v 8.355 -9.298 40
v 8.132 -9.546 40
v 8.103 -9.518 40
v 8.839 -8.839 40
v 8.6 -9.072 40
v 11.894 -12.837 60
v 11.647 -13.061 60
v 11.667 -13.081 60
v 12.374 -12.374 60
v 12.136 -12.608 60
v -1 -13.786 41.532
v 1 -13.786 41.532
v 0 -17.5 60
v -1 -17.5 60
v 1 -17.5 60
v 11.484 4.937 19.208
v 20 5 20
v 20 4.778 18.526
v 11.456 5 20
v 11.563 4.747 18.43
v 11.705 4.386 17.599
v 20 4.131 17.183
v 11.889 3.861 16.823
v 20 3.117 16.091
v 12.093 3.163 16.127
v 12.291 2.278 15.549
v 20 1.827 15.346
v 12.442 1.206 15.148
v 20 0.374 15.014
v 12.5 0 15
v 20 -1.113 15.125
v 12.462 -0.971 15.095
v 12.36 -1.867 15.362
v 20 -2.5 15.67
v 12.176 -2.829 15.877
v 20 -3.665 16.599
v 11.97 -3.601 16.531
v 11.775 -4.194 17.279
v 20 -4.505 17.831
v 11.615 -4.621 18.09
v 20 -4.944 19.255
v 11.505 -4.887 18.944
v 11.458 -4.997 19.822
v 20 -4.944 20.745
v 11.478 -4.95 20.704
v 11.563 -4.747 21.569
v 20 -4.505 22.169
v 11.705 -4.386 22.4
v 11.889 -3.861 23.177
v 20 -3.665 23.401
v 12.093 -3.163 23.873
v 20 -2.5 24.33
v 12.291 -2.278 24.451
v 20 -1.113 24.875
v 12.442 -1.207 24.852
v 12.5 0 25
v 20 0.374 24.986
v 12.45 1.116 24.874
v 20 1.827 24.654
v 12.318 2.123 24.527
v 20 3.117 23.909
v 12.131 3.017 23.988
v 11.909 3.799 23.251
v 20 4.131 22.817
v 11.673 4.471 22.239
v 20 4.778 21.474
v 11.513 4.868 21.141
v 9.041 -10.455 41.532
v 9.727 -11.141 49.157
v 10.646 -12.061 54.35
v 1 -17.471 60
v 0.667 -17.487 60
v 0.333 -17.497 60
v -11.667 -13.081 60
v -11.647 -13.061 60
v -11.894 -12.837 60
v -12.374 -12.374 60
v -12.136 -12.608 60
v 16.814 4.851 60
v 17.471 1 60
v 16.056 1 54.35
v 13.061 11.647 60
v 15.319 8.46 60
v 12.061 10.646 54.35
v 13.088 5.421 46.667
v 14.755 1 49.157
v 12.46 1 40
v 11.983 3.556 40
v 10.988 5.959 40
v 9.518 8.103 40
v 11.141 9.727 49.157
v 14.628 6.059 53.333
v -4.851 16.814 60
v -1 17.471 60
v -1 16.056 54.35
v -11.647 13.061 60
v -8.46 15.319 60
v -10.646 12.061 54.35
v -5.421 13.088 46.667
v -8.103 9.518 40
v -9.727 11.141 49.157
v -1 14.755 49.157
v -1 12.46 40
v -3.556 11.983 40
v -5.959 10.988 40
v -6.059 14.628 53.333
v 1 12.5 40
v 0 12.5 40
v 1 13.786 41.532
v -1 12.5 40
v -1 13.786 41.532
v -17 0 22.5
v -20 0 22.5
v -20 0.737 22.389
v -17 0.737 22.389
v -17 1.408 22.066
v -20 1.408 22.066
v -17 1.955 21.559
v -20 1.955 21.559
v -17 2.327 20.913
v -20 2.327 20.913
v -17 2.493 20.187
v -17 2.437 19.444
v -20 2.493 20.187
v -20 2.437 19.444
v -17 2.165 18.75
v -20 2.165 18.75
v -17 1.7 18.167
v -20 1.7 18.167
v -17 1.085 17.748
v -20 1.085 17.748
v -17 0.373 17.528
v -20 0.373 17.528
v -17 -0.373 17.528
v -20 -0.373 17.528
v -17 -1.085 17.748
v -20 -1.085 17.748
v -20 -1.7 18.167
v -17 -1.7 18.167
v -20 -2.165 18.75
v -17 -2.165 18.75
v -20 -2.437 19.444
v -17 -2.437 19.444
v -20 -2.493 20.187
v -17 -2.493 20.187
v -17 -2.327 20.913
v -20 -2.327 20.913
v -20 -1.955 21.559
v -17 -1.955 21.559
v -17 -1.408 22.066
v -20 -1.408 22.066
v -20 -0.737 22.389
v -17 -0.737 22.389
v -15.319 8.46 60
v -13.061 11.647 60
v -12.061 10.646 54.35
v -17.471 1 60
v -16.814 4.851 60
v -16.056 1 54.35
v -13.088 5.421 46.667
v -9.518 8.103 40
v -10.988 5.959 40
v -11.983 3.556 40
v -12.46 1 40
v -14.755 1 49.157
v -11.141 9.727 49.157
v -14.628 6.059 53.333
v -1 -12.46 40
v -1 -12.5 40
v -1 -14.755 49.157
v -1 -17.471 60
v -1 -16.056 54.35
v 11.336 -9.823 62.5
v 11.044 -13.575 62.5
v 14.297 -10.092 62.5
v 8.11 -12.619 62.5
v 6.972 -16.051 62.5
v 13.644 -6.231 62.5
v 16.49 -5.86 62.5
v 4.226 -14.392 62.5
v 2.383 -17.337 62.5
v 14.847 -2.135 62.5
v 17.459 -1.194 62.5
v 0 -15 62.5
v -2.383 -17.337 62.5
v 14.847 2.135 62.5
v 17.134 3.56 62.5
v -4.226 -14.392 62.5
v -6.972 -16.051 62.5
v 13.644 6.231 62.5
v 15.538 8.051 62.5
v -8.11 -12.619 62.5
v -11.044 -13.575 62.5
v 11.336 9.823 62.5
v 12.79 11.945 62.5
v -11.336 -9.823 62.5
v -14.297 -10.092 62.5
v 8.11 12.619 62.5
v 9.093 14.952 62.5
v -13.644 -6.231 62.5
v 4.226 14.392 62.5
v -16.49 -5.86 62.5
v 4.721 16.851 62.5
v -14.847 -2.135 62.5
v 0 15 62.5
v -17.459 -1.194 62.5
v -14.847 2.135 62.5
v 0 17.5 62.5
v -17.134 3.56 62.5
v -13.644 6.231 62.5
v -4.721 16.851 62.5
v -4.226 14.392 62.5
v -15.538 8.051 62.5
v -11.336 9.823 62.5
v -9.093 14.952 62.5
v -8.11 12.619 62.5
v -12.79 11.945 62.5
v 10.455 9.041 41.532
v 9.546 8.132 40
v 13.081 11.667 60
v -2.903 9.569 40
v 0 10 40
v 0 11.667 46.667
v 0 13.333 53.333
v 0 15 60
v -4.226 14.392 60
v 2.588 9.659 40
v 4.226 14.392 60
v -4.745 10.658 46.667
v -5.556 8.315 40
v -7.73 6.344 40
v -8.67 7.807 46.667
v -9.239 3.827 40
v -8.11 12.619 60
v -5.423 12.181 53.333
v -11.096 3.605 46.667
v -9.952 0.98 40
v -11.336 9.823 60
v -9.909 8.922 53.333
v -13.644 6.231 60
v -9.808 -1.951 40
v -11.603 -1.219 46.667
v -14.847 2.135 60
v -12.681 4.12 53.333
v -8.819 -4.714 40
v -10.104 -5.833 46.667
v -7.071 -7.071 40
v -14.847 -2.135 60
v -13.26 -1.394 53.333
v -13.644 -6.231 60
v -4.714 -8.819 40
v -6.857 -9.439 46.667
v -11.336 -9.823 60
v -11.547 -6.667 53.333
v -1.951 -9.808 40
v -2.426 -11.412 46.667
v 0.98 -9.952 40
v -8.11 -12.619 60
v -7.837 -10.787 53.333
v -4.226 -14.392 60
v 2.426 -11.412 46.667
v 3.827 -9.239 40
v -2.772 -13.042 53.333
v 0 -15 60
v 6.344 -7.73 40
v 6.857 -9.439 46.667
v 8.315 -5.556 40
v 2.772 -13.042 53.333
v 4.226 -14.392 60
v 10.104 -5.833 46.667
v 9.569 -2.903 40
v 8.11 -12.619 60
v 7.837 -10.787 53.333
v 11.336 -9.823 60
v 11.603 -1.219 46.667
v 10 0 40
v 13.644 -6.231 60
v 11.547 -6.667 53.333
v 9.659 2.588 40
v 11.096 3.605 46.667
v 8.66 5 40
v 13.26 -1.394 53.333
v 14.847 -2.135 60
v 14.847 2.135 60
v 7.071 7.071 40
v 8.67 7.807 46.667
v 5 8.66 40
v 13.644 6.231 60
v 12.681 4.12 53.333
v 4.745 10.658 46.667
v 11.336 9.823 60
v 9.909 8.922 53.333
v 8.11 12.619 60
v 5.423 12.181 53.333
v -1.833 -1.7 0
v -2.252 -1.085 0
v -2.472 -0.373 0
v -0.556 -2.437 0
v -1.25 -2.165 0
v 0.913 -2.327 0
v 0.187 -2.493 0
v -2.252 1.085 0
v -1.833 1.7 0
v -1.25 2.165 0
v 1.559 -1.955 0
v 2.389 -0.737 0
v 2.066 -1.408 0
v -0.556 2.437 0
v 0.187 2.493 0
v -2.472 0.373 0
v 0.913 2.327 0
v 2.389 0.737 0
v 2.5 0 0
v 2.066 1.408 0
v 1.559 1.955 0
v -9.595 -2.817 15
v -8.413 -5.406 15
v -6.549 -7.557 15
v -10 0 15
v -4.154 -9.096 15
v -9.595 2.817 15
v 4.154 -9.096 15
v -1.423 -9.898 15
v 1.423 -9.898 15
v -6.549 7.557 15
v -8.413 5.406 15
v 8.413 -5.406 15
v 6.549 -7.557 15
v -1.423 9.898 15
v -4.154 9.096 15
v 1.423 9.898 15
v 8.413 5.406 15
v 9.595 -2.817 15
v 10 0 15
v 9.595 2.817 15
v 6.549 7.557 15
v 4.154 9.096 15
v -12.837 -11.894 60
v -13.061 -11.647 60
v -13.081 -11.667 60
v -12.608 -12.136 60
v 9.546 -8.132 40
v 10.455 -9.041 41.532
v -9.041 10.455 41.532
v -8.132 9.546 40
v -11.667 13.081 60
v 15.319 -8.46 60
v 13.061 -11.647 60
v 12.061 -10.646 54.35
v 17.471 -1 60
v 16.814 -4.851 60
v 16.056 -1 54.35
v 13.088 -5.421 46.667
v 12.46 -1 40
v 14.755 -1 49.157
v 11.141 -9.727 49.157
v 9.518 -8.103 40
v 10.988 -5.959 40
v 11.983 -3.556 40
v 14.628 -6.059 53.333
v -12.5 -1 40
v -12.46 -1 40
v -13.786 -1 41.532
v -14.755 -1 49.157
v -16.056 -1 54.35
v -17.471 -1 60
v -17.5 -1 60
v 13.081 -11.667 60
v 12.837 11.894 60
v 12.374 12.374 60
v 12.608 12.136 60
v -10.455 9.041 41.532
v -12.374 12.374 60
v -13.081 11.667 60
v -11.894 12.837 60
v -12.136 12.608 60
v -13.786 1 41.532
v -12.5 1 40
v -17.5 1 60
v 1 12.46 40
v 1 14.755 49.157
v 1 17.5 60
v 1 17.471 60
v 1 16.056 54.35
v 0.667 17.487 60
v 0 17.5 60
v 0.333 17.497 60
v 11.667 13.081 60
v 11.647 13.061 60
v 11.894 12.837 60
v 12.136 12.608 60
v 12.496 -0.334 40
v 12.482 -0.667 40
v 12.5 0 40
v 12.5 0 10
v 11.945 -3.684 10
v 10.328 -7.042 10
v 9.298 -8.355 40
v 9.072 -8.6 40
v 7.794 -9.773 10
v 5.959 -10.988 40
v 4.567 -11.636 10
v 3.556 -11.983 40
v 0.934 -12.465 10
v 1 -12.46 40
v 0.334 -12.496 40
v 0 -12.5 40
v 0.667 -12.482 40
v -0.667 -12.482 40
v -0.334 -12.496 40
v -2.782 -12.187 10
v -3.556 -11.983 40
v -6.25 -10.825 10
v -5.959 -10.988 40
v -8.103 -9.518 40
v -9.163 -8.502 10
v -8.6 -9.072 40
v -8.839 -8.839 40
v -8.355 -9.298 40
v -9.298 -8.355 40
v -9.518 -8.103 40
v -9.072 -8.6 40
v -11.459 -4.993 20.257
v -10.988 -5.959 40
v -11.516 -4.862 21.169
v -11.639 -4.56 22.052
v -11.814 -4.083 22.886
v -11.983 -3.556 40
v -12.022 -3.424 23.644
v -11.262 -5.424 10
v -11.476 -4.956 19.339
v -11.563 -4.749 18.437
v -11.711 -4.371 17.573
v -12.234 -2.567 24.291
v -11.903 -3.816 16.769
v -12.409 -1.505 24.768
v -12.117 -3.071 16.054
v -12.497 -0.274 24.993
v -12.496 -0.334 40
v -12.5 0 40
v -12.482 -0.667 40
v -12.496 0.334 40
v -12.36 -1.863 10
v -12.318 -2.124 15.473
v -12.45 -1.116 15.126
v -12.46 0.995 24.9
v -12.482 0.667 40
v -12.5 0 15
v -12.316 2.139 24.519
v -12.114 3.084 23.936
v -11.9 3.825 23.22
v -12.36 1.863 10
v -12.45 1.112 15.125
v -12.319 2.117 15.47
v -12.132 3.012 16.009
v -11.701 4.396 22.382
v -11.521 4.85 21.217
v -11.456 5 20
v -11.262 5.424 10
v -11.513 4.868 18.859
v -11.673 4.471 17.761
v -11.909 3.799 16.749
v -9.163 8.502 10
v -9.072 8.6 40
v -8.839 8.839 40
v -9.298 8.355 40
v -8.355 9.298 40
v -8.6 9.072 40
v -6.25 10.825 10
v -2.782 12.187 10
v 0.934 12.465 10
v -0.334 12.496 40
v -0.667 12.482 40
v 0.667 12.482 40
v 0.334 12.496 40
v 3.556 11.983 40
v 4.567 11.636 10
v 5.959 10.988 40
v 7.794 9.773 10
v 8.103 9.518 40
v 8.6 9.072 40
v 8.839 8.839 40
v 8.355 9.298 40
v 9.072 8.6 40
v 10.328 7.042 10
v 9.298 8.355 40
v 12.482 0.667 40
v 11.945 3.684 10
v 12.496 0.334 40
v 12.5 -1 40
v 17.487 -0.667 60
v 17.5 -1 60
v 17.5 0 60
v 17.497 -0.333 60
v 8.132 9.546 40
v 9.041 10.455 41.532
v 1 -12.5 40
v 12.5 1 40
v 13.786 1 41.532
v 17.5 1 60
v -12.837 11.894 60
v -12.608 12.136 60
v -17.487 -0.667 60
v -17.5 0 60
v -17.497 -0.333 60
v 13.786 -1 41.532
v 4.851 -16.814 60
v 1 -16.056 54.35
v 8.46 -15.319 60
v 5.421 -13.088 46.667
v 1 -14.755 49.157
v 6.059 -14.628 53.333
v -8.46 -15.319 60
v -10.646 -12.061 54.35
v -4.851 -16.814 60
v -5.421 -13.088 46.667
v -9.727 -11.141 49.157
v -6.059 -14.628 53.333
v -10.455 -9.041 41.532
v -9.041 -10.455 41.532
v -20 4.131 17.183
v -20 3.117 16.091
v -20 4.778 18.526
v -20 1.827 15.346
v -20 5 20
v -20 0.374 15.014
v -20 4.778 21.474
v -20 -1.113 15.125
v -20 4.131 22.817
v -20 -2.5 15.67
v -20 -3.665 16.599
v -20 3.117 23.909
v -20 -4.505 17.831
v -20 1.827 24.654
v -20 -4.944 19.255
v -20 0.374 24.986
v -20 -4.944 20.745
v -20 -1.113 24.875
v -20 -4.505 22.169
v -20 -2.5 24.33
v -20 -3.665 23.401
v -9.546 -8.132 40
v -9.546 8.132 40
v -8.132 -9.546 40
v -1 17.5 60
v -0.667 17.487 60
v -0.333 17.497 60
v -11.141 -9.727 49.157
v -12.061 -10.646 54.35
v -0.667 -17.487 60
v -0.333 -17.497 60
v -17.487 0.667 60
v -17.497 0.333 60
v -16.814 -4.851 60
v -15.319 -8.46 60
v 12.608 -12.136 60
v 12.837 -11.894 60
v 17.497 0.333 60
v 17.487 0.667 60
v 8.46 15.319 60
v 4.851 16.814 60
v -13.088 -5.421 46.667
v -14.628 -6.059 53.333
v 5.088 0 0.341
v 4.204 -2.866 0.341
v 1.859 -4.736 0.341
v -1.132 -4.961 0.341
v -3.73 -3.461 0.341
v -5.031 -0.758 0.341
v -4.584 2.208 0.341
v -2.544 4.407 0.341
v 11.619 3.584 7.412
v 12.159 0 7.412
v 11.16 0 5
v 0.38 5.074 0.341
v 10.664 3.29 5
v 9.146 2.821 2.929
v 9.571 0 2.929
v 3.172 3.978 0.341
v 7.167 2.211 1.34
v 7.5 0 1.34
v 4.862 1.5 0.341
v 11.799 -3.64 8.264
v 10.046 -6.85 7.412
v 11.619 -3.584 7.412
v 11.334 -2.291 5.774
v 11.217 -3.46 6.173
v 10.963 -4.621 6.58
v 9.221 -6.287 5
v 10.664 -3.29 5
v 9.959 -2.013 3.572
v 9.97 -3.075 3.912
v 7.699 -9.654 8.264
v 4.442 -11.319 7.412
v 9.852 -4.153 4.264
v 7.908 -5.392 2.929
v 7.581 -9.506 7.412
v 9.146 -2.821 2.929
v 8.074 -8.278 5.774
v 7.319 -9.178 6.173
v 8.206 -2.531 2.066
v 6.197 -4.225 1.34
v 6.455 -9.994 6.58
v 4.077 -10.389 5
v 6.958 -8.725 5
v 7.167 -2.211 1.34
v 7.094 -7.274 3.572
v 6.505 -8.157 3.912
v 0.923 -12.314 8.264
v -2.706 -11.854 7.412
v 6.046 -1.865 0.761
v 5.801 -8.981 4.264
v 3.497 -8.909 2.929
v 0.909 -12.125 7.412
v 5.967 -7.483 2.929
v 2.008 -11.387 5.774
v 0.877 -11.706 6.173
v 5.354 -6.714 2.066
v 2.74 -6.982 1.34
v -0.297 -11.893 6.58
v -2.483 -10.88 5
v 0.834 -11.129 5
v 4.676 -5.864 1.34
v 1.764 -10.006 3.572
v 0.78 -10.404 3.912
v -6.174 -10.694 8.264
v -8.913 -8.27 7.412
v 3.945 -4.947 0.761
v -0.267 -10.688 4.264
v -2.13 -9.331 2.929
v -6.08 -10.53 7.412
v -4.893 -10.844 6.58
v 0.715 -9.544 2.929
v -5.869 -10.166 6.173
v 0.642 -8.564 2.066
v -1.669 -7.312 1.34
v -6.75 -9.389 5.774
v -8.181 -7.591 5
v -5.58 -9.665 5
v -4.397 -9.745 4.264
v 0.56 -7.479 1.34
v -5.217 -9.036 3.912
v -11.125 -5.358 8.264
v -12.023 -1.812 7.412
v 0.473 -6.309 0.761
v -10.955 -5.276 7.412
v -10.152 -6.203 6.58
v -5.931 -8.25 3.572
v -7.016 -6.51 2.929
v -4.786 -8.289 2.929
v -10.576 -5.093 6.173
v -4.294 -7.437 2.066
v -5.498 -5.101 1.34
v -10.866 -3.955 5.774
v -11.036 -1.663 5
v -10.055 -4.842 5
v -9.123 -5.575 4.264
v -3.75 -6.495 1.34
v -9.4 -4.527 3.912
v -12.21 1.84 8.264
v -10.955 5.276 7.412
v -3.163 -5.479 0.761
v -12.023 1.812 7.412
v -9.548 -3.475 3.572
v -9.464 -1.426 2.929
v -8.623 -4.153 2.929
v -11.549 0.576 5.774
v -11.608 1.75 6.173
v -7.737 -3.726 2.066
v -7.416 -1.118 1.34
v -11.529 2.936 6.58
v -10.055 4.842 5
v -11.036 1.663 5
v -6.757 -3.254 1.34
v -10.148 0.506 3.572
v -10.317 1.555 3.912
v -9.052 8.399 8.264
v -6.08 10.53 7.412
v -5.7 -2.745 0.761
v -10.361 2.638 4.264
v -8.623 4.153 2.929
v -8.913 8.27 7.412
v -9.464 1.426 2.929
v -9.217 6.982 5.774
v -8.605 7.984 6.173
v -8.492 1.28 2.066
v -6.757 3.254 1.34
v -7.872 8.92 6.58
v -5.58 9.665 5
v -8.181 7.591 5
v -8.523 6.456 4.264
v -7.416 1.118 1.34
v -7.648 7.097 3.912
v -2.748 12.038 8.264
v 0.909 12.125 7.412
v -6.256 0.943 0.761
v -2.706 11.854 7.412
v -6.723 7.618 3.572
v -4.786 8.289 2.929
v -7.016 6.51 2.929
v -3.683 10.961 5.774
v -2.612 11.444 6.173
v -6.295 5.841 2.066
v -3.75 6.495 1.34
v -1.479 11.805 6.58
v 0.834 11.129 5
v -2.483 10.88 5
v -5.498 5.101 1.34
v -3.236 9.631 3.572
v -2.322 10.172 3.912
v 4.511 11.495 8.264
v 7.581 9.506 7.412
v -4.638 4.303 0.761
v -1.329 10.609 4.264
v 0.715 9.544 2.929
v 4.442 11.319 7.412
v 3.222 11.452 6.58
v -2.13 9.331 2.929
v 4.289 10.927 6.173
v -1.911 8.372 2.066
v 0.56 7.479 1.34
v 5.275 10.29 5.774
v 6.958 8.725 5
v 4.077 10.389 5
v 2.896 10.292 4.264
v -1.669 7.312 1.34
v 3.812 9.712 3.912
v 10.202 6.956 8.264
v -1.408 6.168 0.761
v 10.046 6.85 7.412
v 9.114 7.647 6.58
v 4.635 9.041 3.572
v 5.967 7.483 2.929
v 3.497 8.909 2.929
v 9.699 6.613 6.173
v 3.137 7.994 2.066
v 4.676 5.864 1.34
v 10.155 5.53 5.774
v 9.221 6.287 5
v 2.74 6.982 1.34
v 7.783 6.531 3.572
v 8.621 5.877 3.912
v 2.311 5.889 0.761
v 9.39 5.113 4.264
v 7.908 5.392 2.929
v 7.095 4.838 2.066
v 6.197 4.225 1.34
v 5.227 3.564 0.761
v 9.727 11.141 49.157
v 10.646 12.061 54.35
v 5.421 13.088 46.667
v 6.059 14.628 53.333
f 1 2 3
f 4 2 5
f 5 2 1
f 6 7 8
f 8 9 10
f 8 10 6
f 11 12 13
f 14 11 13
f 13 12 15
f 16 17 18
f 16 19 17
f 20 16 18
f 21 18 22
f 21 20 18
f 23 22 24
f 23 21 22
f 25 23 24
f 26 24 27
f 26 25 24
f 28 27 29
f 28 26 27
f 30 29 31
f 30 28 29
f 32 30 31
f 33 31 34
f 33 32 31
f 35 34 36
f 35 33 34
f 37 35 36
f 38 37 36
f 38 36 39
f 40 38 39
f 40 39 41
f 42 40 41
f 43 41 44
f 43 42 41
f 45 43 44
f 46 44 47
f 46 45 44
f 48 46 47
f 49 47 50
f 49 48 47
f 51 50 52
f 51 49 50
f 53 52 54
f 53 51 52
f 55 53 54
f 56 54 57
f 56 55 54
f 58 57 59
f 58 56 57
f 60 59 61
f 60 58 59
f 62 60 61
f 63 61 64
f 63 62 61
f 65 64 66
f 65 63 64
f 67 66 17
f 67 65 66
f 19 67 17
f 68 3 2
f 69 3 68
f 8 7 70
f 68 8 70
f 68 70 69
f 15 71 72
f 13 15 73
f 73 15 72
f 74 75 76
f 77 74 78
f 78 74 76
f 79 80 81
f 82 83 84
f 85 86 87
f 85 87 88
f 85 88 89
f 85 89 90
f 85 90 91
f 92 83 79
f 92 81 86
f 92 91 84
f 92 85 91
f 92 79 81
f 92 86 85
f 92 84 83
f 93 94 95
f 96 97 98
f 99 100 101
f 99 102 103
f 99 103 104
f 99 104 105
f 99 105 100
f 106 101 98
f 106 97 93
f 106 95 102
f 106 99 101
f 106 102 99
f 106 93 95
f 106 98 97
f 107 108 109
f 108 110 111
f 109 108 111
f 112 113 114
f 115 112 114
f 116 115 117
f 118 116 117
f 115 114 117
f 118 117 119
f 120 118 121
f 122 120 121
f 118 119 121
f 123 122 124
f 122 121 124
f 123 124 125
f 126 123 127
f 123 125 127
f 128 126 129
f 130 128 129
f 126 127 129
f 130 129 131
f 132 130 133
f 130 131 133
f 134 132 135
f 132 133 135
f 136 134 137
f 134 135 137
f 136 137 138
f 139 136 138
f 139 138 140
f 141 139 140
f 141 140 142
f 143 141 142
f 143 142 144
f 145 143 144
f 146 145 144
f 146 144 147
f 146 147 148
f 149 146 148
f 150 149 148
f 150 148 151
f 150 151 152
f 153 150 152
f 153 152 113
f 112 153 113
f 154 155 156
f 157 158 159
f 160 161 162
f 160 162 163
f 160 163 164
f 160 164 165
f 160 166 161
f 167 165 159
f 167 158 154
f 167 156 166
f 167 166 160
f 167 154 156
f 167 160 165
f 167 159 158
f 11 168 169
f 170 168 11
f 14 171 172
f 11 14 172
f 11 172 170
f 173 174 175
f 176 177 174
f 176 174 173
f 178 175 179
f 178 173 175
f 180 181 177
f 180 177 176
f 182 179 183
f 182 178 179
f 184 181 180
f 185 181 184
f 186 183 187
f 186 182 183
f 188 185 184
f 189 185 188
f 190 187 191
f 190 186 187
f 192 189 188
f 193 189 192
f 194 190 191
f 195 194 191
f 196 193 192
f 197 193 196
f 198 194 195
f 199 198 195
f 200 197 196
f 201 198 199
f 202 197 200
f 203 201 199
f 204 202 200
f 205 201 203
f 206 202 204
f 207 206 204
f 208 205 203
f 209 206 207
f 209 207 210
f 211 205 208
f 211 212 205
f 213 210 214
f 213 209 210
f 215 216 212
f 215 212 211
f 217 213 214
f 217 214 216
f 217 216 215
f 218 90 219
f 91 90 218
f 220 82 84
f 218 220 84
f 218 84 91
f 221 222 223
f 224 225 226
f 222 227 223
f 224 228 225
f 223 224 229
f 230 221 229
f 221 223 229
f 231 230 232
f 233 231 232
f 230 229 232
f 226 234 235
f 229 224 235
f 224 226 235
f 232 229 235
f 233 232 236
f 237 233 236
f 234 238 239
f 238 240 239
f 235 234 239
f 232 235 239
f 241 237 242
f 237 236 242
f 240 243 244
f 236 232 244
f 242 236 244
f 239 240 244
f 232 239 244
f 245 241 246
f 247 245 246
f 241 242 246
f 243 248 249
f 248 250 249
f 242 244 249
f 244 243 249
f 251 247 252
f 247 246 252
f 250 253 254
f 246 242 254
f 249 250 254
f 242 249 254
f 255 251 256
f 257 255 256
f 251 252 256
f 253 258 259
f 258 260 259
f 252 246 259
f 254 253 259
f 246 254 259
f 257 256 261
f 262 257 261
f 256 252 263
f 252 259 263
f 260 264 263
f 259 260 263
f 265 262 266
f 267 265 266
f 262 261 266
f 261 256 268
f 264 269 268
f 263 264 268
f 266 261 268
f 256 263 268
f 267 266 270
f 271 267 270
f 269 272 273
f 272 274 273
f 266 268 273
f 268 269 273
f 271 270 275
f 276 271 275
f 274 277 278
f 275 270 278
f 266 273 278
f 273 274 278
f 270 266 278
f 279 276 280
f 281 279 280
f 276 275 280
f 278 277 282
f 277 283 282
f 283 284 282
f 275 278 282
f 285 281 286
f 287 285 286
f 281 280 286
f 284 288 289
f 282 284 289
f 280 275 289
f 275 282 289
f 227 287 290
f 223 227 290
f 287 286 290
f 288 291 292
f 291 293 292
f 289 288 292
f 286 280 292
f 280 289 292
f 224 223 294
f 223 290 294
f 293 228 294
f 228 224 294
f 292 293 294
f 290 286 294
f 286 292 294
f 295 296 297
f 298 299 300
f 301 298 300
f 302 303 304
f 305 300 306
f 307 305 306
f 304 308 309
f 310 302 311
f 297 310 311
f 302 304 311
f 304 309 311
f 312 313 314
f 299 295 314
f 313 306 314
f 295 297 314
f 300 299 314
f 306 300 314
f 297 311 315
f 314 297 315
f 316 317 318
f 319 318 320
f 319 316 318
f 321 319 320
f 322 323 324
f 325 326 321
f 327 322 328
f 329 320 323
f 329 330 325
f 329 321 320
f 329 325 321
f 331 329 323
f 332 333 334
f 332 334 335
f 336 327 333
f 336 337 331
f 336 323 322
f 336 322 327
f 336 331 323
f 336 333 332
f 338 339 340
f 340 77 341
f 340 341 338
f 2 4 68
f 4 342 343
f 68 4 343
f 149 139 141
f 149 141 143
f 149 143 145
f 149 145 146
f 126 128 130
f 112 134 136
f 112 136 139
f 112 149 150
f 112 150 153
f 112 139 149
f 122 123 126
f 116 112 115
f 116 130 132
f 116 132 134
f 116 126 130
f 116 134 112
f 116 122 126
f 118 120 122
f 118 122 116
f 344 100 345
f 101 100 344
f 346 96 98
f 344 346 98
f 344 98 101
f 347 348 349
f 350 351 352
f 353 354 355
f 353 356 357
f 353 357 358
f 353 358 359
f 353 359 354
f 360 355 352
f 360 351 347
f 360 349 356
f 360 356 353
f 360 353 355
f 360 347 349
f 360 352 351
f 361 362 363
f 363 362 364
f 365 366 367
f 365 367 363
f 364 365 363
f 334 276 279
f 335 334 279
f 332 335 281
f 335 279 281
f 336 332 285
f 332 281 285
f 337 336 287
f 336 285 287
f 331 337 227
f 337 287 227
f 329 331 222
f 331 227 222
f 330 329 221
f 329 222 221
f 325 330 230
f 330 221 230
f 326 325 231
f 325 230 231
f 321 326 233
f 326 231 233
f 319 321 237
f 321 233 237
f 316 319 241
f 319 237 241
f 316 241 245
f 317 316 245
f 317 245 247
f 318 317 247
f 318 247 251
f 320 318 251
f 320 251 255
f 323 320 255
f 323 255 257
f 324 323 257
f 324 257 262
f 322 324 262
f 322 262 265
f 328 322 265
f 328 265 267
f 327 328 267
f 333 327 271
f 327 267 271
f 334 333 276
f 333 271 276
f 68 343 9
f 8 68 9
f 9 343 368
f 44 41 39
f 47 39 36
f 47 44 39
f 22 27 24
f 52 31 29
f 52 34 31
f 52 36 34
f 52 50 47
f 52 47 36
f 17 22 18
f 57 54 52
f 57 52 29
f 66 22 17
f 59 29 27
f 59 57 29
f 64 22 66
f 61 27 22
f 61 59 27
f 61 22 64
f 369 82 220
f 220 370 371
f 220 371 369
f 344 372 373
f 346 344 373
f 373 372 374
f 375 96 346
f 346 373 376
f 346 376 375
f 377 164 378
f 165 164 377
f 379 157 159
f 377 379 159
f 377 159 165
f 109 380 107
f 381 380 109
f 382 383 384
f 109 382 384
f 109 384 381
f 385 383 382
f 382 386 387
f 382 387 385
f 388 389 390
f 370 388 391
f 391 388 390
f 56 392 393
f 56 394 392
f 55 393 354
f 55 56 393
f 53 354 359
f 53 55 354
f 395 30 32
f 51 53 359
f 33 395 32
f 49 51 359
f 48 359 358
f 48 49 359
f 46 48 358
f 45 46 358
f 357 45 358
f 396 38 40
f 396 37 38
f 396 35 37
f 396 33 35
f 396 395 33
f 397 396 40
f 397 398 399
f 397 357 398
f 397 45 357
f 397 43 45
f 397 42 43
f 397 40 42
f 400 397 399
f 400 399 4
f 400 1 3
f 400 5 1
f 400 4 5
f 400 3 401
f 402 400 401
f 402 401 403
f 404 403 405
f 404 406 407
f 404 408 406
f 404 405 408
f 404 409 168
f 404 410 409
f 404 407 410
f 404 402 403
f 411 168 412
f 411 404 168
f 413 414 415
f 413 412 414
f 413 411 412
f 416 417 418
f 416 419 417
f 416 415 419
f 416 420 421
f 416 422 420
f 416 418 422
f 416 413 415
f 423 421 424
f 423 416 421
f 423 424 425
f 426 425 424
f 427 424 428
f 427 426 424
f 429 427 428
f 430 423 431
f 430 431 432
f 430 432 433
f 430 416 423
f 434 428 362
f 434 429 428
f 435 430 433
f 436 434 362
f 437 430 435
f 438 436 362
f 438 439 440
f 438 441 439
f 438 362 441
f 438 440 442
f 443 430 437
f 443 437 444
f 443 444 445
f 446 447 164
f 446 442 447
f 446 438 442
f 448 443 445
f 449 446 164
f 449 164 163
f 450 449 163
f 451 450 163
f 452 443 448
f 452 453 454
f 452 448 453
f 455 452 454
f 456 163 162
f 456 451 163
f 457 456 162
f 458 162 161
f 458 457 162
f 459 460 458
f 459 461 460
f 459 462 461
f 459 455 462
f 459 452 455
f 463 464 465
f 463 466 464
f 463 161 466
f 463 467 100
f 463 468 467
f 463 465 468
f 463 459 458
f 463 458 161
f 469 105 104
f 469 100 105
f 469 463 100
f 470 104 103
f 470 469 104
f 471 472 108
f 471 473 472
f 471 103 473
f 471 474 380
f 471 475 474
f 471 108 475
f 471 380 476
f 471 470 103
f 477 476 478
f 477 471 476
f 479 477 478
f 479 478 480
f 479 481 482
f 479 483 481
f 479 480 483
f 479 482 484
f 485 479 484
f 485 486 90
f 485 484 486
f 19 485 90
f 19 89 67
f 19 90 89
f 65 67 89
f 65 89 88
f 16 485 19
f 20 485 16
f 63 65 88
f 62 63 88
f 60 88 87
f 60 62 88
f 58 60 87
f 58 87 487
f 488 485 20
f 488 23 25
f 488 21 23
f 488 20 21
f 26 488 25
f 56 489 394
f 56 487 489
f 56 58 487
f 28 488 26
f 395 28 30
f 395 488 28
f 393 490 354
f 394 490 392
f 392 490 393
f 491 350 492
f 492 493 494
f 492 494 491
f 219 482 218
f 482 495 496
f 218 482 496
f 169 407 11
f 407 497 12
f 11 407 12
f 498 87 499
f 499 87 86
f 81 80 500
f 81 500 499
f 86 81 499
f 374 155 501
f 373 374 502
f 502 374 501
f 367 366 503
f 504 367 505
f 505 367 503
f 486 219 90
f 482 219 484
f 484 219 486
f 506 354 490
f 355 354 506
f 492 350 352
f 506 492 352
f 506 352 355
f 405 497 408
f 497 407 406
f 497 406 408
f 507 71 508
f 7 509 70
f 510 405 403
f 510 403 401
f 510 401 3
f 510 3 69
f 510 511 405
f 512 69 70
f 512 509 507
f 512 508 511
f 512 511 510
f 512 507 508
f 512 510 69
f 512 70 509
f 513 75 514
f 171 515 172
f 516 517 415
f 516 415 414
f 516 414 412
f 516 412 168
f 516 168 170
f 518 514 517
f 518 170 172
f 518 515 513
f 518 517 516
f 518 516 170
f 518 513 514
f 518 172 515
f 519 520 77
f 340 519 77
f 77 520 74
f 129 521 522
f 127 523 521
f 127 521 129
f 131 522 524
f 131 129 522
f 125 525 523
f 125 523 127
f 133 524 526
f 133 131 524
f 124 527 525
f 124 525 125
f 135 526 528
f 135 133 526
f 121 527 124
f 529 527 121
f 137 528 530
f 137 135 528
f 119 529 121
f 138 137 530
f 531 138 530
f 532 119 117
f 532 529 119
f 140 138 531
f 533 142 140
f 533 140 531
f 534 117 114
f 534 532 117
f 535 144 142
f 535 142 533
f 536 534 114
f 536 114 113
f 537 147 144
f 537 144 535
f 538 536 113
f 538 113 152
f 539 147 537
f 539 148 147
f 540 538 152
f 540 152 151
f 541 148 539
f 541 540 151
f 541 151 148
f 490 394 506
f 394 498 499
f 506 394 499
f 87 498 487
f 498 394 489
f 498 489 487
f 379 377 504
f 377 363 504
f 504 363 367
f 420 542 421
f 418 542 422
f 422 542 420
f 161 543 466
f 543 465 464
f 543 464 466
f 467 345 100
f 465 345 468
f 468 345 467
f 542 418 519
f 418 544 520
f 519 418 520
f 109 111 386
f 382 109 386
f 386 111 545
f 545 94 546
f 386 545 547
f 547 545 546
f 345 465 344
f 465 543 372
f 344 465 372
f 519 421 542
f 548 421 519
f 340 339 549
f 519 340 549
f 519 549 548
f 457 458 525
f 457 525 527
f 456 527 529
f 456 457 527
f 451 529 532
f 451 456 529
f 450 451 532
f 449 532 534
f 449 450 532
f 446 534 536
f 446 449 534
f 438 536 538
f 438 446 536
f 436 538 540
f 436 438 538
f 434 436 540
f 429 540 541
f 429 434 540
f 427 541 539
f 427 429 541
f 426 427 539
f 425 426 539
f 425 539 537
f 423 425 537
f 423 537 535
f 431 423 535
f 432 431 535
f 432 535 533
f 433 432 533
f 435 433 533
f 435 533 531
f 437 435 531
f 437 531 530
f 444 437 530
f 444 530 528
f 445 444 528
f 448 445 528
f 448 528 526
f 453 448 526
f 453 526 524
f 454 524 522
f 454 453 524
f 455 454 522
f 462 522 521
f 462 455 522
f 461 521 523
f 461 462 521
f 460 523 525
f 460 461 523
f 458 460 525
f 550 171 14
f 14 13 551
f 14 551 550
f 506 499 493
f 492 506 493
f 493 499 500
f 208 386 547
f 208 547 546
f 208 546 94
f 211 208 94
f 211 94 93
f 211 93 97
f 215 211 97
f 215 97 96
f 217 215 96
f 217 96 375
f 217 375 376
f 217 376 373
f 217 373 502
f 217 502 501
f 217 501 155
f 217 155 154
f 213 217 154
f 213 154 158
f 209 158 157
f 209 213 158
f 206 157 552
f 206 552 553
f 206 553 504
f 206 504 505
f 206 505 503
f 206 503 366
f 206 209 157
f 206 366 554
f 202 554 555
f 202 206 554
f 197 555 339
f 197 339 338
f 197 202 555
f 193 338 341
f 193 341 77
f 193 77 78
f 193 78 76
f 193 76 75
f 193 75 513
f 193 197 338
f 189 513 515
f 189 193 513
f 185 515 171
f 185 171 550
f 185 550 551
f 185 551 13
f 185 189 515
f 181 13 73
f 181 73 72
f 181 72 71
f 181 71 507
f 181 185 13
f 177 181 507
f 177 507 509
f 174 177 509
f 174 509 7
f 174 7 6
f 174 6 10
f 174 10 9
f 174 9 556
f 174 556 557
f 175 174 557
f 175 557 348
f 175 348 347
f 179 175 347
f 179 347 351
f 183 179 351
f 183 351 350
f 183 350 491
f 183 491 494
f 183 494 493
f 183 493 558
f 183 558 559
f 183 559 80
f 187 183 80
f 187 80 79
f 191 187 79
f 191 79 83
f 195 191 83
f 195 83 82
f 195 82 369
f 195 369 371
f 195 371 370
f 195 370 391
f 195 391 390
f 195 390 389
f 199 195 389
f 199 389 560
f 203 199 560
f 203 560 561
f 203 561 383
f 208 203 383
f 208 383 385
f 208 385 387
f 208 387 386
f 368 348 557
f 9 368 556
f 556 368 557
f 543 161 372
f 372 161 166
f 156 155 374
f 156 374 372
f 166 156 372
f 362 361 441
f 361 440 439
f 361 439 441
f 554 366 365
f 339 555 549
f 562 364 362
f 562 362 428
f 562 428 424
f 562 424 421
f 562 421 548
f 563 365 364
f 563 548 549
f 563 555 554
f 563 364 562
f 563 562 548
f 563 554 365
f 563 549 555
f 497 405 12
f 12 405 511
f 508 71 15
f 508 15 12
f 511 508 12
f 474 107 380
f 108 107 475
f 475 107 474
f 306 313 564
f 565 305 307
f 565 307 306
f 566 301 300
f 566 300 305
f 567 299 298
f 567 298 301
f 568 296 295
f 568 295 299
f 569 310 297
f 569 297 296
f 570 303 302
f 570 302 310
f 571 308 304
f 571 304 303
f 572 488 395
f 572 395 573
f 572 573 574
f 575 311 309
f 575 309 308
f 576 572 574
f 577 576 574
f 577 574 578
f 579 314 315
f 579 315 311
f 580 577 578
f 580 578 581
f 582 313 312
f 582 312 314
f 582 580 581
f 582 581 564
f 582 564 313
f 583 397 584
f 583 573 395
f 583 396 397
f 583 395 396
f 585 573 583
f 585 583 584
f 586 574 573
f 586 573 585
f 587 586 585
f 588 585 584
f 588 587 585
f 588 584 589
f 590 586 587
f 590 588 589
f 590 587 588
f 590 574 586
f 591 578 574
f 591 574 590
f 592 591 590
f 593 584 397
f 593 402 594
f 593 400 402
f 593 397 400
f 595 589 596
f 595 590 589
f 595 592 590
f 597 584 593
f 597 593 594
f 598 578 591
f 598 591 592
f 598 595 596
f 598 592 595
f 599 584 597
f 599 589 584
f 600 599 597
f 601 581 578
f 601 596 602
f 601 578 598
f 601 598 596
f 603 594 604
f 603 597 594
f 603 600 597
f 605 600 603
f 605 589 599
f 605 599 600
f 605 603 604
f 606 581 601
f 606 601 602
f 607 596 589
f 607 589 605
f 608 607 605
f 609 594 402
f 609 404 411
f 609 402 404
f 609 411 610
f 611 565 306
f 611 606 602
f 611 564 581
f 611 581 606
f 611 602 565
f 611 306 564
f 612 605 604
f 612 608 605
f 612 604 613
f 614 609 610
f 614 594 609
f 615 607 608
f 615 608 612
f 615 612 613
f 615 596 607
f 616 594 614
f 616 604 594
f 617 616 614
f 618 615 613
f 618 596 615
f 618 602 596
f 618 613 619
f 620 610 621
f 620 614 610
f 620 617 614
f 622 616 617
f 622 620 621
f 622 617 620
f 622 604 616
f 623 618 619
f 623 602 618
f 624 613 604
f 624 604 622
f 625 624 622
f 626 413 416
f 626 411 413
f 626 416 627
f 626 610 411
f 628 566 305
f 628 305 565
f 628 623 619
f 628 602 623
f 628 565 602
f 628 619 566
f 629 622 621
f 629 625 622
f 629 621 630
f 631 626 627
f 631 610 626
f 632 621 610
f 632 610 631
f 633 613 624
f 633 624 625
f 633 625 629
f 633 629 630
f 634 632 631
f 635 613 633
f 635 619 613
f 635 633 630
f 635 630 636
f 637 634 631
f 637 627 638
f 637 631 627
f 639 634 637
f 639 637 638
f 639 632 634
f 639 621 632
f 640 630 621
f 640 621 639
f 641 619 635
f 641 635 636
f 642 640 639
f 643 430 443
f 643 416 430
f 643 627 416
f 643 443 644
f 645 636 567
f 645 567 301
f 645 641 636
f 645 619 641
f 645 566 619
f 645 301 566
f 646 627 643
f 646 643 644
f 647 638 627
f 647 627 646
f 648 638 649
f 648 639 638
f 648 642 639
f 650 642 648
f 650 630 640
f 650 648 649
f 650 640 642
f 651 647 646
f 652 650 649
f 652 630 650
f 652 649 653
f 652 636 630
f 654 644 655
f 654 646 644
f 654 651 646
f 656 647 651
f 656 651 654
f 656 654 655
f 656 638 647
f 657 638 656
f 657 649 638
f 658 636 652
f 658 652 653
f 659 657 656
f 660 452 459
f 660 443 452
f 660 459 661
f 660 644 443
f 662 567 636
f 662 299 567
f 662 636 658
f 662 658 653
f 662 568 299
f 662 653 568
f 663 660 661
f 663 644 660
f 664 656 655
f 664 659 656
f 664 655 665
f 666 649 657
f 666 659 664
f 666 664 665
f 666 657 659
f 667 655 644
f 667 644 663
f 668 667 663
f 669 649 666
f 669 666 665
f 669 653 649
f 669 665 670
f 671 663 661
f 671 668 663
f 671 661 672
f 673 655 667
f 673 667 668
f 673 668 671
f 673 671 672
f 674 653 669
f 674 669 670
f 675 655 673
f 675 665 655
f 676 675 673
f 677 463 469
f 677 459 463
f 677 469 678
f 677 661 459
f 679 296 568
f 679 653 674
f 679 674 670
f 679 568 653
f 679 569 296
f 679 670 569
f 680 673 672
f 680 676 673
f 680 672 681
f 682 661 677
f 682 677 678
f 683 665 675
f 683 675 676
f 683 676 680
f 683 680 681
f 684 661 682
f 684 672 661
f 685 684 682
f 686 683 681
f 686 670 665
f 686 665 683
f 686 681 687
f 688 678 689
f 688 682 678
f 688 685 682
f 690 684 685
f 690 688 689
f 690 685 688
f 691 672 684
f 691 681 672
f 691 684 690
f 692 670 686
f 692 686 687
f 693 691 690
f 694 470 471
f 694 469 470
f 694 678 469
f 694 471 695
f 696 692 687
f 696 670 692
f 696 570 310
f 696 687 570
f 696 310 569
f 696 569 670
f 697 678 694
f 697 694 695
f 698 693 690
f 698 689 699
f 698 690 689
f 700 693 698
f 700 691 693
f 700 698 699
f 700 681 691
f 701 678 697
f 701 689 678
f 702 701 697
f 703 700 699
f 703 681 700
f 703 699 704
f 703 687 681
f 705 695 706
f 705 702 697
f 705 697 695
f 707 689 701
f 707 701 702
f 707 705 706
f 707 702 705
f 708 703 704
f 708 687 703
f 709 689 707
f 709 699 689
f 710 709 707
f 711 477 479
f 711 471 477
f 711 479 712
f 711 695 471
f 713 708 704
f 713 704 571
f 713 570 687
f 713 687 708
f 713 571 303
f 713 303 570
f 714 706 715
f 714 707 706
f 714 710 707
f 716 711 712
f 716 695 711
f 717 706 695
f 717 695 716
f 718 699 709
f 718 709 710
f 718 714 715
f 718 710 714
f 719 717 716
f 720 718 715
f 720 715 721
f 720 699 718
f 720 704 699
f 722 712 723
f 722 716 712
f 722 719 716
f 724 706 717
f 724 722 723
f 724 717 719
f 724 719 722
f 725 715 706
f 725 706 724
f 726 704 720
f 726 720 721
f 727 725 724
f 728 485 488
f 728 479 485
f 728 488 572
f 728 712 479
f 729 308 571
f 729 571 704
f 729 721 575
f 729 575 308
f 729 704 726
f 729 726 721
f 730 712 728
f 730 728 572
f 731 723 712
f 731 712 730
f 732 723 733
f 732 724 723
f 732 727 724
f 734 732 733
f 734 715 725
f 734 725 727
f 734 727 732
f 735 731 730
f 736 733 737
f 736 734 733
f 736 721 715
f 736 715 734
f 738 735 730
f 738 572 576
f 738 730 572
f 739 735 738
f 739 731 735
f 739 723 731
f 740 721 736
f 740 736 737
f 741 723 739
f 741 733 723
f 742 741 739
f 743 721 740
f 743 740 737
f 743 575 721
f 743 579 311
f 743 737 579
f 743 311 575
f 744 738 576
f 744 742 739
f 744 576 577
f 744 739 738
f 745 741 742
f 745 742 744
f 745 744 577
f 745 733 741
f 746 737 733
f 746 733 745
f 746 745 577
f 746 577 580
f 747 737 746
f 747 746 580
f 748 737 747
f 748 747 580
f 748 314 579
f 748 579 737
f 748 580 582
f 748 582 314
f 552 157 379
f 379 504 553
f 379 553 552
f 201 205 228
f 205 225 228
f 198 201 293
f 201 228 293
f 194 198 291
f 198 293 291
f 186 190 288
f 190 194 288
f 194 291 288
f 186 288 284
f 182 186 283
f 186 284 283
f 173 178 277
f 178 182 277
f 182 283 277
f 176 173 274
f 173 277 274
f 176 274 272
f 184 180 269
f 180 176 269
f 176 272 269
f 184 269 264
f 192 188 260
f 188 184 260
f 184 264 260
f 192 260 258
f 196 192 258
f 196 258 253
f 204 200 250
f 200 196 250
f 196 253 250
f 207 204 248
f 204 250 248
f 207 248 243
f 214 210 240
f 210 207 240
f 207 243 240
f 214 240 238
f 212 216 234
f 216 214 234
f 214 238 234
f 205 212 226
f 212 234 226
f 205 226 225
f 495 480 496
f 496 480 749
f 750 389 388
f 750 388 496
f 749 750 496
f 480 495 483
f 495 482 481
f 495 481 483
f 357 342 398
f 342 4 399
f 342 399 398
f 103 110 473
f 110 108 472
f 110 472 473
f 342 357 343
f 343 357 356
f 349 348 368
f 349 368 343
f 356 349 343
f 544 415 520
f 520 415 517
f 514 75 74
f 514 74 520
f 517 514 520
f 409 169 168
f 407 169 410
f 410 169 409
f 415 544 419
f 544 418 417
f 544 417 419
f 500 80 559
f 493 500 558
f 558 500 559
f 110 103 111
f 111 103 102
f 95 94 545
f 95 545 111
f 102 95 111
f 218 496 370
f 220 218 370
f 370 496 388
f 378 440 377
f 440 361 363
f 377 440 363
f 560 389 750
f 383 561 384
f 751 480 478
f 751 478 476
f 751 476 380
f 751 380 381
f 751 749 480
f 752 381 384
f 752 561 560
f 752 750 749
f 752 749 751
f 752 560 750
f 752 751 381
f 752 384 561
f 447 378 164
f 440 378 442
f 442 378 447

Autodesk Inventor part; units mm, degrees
sketch "Sketch19" plane through (0, 0, 0) normal (0, 0, 1) x (1, 0, 0)
  circle A0 centre (0, 0) radius 12.5
  dimension "d130" = 25
extrude "Extrusion17" add sketch "Sketch19" along normal blind 40
sketch "Sketch20" plane through (0, 0, 40) normal (0, 0, 1) x (1, 0, 0)
  circle A0 centre (0, 0) radius 10
  dimension "d133" = 20
fillet "Fillet6" radius 10 1 edges at (-12.5, 0, 0)
extrude "Extrusion18" cut sketch "Sketch20" against normal blind 25
ref_plane "Work Plane3" through (10, 0, 0) normal (1, 0, 0) x (0, 1, 0)
sketch "Sketch21" plane through (10, 0, 0) normal (1, 0, 0) x (0, 1, 0)
  line L0 (0, 0) -> (0, 20)
  circle A0 centre (0, 20) radius 5
  dimension "d138" = 20
  dimension "d139" = 10
extrude "Extrusion19" add sketch "Sketch21" along normal blind 10
mirror "Mirror1" about plane through (0, 0, 0) normal (1, 0, 0) of "Extrusion19"
sketch "Sketch22" plane through (-20, 0, 20) normal (-1, 0, 0) x (0, 0, 1)
  circle A0 centre (0, 0) radius 2.5
  point P0 (-20, 0)
  dimension "d142" = 5
extrude "Extrusion20" cut sketch "Sketch22" against normal blind 3
sketch "Sketch26" plane through (0, 0, 0) normal (1, 0, 0) x (0, 1, 0)
  line L0 (-10, 40) -> (10, 40) projected
  line L1 (12.5, 40) -> (-12.5, 40) projected
  line L2 (10, 40) -> (12.5, 40)
  line L3 (17.5, 60) -> (12.5, 40)
  line L4 (17.5, 60) -> (17.5, 62.5)
  line L5 (17.5, 62.5) -> (15, 62.5)
  line L6 (15, 62.5) -> (15, 60)
  line L7 (10, 40) -> (15, 60)
  line L8 (0, -10.5) -> (0, 63) projected
  point P0 (0, 0)
  dimension "d147" = 2.5
  dimension "d148" = 2.5
revolve "Revolution1" add sketch "Sketch26" angle 360 about axis through (0, 0, -10) along (0, 0, 1)
sketch "Sketch27" plane through (0, 0, 0) normal (1, 0, 0) x (0, 1, 0)
  line L0 (12.5, 40) -> (13.7856, 41.5321)
  line L1 (12.5, 40) -> (14.5, 40) construction
  line L2 (13.7856, 41.5321) -> (17.5, 60)
  line L3 (12.5, 40) -> (-12.5, 40) projected
  line L4 (12.5, 40) -> (11.5, 40)
  line L5 (-17.5, 60) -> (17.5, 60) projected
  line L6 (17.5, 60) -> (16.5, 60)
  line L7 (16.5, 60) -> (11.5, 40)
  point P0 (0, 0)
  dimension "d150" = 2
  dimension "d151" = 50
  dimension "d152" = 1
  dimension "d153" = 1
extrude "Extrusion21" add sketch "Sketch27" along normal mid plane 2
pattern_circular "Circular Pattern2" count 8 over 360 about axis through (0, 0, -10) along (0, 0, 1) of "Extrusion21"
properties part number "Waterkanon" material "S235"
